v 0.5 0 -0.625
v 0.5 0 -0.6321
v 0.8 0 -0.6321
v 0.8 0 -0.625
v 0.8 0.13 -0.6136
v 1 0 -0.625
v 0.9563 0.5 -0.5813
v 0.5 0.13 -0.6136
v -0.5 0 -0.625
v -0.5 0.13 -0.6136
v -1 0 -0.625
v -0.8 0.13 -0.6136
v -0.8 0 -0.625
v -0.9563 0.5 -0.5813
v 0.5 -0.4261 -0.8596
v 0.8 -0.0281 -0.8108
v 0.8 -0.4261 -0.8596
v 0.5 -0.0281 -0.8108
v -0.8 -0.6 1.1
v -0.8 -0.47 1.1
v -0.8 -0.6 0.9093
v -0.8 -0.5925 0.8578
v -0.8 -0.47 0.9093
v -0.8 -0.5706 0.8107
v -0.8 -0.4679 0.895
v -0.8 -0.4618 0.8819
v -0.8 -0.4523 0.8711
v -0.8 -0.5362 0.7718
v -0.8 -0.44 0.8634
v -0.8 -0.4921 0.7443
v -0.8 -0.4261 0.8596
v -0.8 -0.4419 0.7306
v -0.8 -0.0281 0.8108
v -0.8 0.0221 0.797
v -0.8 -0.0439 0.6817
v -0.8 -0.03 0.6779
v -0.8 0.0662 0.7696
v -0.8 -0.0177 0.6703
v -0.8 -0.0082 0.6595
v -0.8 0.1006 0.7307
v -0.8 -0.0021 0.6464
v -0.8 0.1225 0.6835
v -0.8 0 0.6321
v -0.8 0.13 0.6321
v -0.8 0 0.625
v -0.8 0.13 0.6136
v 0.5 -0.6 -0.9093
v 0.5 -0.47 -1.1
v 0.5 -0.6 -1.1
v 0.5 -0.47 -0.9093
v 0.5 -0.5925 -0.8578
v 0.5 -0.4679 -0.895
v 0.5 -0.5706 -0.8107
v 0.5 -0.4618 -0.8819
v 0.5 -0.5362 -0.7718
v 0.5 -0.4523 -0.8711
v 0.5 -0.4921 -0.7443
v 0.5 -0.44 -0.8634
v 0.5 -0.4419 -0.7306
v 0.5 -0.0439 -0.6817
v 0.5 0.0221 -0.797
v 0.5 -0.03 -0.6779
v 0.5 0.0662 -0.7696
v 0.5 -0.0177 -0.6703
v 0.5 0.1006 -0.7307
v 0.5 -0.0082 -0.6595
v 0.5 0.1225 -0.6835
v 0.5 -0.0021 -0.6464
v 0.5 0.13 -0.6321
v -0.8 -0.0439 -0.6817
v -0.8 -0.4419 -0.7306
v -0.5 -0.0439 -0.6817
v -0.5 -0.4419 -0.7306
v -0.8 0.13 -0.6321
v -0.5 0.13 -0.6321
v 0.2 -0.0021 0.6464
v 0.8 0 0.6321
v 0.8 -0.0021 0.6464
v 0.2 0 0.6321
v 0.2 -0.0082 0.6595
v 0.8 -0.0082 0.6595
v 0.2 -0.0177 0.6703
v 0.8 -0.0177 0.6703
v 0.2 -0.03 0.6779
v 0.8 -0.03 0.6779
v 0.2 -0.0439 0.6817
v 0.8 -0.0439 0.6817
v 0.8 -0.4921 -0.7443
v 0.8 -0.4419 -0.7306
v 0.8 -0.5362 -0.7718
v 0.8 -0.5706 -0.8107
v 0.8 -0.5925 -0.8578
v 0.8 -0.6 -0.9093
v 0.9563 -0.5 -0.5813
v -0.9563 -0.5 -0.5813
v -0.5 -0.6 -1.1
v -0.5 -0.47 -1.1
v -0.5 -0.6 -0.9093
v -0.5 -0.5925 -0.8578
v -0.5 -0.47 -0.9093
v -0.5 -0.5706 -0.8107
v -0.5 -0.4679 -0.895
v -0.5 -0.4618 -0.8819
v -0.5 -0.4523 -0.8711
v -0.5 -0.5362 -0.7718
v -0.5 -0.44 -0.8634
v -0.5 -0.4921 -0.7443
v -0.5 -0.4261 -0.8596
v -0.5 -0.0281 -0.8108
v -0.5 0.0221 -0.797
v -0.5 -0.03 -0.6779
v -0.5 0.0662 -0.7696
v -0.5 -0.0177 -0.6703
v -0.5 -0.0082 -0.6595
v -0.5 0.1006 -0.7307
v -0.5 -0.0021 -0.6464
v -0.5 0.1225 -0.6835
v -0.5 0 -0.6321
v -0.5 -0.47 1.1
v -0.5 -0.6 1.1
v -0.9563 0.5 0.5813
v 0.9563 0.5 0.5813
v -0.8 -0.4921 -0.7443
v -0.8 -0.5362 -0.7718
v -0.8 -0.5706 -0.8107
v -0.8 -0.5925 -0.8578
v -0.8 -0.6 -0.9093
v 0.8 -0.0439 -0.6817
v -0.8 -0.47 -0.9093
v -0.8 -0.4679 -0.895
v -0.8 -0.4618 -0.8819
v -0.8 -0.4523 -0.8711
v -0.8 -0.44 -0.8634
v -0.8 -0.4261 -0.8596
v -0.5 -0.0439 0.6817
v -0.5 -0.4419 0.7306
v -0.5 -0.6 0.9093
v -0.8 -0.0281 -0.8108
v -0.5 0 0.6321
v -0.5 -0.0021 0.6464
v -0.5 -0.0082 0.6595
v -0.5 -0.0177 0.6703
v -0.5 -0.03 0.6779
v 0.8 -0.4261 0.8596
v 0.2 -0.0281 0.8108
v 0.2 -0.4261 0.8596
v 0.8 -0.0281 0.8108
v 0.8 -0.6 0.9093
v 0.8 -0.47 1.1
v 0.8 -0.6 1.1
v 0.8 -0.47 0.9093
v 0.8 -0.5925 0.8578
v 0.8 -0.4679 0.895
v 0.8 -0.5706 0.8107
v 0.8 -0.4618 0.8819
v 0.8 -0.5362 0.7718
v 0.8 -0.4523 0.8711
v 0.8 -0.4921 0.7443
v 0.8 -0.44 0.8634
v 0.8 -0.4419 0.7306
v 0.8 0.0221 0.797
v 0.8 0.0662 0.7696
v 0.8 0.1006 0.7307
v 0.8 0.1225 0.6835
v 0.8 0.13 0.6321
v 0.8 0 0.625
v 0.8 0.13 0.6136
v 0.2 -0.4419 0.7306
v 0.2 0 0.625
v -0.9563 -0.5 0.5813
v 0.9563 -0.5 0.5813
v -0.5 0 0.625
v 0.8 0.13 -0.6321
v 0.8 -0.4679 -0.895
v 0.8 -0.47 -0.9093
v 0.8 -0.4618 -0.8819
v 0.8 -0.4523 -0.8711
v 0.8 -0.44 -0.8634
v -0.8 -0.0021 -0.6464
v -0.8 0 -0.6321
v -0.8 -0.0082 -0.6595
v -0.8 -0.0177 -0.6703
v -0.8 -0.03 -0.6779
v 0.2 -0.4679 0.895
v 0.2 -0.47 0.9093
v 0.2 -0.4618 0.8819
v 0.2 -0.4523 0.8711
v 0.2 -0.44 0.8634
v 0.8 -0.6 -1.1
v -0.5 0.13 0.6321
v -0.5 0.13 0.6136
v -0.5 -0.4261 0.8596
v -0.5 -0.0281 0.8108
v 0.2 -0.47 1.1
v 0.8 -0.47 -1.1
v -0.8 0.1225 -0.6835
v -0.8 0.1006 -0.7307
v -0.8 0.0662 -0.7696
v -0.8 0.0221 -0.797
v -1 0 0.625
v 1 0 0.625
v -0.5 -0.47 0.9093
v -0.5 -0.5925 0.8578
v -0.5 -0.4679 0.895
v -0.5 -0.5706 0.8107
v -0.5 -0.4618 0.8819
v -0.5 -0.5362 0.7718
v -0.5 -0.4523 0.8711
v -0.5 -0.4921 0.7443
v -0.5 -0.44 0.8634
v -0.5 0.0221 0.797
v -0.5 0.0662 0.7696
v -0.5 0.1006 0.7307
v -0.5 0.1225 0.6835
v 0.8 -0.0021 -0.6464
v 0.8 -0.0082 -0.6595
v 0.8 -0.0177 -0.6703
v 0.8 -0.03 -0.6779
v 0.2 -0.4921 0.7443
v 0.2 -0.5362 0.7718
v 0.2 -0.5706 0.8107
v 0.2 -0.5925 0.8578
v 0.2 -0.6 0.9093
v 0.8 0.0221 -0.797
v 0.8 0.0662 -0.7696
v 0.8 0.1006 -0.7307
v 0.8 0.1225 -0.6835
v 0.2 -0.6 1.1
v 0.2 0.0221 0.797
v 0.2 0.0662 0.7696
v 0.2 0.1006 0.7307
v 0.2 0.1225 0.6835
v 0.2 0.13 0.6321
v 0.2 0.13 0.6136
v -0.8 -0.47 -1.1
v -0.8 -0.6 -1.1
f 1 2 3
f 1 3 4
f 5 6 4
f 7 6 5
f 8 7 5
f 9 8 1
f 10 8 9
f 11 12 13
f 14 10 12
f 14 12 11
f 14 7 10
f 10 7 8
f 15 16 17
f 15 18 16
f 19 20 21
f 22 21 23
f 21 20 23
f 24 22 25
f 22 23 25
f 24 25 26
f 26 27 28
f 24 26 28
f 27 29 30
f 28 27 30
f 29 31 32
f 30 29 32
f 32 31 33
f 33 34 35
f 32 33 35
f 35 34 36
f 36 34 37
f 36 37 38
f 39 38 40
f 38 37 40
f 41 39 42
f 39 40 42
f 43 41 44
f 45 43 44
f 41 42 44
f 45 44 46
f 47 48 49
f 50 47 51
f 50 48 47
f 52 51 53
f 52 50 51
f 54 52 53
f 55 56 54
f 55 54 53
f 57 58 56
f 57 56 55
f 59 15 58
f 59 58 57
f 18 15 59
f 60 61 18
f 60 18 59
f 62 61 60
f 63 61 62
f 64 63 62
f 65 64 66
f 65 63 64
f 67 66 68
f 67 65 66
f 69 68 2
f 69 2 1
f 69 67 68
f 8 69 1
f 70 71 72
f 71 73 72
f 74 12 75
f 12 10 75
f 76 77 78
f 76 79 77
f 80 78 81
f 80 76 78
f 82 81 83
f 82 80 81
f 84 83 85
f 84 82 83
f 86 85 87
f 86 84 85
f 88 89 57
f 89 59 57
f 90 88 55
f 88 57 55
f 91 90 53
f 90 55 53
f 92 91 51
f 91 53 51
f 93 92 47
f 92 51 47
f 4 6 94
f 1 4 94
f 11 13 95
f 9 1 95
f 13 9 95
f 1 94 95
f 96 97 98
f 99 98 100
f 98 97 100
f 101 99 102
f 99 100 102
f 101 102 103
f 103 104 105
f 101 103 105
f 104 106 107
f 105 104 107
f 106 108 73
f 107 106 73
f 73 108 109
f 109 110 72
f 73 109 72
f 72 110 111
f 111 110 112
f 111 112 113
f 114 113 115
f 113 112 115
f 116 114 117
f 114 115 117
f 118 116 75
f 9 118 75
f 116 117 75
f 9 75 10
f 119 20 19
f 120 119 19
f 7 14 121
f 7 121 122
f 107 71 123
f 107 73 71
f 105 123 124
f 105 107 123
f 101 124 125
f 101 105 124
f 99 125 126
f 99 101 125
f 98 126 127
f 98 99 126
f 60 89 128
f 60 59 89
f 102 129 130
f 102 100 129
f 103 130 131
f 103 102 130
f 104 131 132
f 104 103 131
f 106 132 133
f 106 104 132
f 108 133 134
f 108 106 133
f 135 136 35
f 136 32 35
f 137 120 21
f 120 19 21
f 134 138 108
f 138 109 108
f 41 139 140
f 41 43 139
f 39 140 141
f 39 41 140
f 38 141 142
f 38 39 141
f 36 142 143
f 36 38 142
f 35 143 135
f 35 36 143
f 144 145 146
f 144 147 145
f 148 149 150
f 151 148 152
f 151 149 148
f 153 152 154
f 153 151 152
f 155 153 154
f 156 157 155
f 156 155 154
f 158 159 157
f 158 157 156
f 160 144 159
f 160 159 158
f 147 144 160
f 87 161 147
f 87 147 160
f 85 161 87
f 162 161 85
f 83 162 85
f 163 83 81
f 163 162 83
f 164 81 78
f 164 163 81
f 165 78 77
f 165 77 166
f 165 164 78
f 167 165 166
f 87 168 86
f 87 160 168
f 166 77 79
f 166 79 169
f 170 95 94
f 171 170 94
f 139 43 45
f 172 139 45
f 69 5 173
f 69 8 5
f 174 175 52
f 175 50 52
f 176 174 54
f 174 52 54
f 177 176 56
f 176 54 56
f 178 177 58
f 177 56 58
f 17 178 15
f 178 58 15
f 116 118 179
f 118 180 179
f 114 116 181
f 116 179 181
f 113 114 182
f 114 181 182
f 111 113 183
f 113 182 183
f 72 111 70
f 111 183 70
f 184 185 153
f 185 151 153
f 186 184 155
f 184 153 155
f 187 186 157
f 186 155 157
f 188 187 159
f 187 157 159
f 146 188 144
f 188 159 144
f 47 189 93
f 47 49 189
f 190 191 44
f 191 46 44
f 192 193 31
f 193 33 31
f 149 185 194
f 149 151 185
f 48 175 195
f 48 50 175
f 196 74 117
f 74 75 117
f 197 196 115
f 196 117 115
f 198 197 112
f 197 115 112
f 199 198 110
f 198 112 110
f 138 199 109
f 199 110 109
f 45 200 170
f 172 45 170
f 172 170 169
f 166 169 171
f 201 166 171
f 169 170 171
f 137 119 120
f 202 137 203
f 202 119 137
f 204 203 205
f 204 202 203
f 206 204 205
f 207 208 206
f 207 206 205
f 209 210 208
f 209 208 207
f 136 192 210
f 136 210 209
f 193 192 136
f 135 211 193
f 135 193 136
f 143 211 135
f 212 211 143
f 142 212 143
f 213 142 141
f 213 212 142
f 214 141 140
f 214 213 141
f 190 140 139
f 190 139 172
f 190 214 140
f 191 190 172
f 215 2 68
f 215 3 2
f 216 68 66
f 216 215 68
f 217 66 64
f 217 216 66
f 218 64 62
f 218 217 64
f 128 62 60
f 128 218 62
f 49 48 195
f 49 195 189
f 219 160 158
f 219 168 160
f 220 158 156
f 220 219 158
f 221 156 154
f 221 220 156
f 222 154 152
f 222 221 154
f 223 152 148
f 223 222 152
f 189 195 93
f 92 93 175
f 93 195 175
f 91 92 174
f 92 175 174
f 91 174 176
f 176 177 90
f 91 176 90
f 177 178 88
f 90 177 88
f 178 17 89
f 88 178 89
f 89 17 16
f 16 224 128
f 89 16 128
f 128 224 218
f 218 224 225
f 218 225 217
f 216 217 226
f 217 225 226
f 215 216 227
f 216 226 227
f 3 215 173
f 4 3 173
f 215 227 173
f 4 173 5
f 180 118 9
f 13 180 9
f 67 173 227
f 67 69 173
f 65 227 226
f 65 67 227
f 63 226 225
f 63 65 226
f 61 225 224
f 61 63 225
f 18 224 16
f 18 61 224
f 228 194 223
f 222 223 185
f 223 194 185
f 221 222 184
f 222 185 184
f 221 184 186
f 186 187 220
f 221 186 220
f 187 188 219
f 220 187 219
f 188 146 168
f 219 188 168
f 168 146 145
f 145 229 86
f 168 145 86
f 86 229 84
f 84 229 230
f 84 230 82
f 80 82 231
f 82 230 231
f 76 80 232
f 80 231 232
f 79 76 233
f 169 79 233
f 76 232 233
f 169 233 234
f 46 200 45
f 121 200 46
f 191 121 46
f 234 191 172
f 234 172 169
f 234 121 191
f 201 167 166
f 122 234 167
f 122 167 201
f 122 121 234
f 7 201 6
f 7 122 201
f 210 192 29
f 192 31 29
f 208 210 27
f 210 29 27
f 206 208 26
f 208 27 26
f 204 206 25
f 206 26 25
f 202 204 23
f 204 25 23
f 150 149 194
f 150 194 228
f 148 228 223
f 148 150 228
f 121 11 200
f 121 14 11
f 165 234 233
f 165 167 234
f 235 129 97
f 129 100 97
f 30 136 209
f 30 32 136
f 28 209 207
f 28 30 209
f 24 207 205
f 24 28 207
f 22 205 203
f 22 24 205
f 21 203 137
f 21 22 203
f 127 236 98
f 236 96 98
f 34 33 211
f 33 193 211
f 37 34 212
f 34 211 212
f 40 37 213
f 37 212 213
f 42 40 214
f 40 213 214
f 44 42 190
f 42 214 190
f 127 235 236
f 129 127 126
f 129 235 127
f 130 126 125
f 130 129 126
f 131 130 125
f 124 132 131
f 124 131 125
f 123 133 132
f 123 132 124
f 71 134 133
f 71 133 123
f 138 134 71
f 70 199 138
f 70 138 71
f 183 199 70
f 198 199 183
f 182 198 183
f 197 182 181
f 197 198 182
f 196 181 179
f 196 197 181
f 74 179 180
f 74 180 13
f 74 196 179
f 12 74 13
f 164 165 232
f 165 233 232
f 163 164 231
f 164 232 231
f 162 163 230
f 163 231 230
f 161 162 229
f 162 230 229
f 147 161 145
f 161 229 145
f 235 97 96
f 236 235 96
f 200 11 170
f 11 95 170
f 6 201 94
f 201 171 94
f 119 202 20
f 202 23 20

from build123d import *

# Parameters (mm, degrees)
SKETCH1_W                = 2
SKETCH1_H                = 1.25
EXTRUDE1_DEPTH           = 0.5
EXTRUDE1_TAPER           = 5
EXTRUDE1_OTHER_WAY_DEPTH = 0.5
EXTRUDE1_OTHER_WAY_TAPER = 5
EXTRUDE2_START           = 0.5
EXTRUDE2_DEPTH           = 0.3
EXTRUDE2_DEPTH_BACK      = 0.3
EXTRUDE3_START           = 0.65
EXTRUDE3_DEPTH           = 0.15
FILLET1_R                = 0.05
FILLET2_R                = 0.18


with BuildPart() as part:
    # Sketch1 → Extrude1 (new body)
    with BuildSketch(Plane(origin=(0, 0, 0), x_dir=(1, 0, 0), z_dir=(0, 1, 0))):
        Rectangle(SKETCH1_W, SKETCH1_H)
    extrude(amount=EXTRUDE1_DEPTH, taper=EXTRUDE1_TAPER)

    # Sketch1 → Extrude1 other way (add)
    with BuildSketch(Plane(origin=(0, 0, 0), x_dir=(1, 0, 0), z_dir=(0, 1, 0))):
        Rectangle(SKETCH1_W, SKETCH1_H)
    extrude(amount=-EXTRUDE1_OTHER_WAY_DEPTH, taper=EXTRUDE1_OTHER_WAY_TAPER)

    # Sketch2 → Extrude2 (add, two sides)
    with BuildSketch(Plane(origin=(0, 0, 0), x_dir=(0, 0, -1), z_dir=(1, 0, 0)).offset(EXTRUDE2_START)) as extrude2_sk:
        Polygon((-0.613626474, 0.13), (-0.791343548, 0.13), (-0.865014284, -0.47), (-1.1, -0.47), (-1.1, -0.6), (-0.75, -0.6), (-0.676329263, 0), (-0.613626474, 0), align=None)
    extrude(amount=EXTRUDE2_DEPTH)
    extrude(extrude2_sk.sketch, amount=-EXTRUDE2_DEPTH_BACK)

    # Sketch2_3 → Extrude3 (add, symmetric)
    with BuildSketch(Plane(origin=(0, 0, 0), x_dir=(0, 0, -1), z_dir=(1, 0, 0)).offset(EXTRUDE3_START)):
        Polygon((0.613626474, 0.13), (0.791343548, 0.13), (0.865014284, -0.47), (1.1, -0.47), (1.1, -0.6), (0.75, -0.6), (0.676329263, 0), (0.613626474, 0), align=None)
        Polygon((-0.791343548, 0.13), (-0.865014284, -0.47), (-1.1, -0.47), (-1.1, -0.6), (-0.75, -0.6), (-0.676329263, 0), (-0.613626474, 0), (-0.613626474, 0.13), align=None)
    extrude3 = extrude(amount=EXTRUDE3_DEPTH, both=True)

    # Mirror1: Extrude3 across plane
    add(extrude3.mirror(Plane(origin=(0, 0, 0), x_dir=(0, 0, 1), z_dir=(1, 0, 0))))

    # Fillet1
    fillet1_edges = [part.edges().sort_by_distance(p)[0] for p in [
        (-0.65, -0.47, -0.865014284),
        (-0.65, 0, -0.676329263),
        (-0.65, 0, 0.676329263),
        (-0.65, -0.47, 0.865014284),
        (0.5, -0.47, 0.865014284),
        (0.5, 0, 0.676329263),
        (0.65, 0, -0.676329263),
        (0.65, -0.47, -0.865014284),
    ]]
    fillet(fillet1_edges, radius=FILLET1_R)

    # Fillet2
    fillet2_edges = [part.edges().sort_by_distance(p)[0] for p in [
        (-0.65, 0.13, -0.791343548),
        (-0.65, -0.6, -0.75),
        (-0.65, 0.13, 0.791343548),
        (-0.65, -0.6, 0.75),
        (0.5, 0.13, 0.791343548),
        (0.5, -0.6, 0.75),
        (0.65, 0.13, -0.791343548),
        (0.65, -0.6, -0.75),
    ]]
    fillet(fillet2_edges, radius=FILLET2_R)


solid = part.part
